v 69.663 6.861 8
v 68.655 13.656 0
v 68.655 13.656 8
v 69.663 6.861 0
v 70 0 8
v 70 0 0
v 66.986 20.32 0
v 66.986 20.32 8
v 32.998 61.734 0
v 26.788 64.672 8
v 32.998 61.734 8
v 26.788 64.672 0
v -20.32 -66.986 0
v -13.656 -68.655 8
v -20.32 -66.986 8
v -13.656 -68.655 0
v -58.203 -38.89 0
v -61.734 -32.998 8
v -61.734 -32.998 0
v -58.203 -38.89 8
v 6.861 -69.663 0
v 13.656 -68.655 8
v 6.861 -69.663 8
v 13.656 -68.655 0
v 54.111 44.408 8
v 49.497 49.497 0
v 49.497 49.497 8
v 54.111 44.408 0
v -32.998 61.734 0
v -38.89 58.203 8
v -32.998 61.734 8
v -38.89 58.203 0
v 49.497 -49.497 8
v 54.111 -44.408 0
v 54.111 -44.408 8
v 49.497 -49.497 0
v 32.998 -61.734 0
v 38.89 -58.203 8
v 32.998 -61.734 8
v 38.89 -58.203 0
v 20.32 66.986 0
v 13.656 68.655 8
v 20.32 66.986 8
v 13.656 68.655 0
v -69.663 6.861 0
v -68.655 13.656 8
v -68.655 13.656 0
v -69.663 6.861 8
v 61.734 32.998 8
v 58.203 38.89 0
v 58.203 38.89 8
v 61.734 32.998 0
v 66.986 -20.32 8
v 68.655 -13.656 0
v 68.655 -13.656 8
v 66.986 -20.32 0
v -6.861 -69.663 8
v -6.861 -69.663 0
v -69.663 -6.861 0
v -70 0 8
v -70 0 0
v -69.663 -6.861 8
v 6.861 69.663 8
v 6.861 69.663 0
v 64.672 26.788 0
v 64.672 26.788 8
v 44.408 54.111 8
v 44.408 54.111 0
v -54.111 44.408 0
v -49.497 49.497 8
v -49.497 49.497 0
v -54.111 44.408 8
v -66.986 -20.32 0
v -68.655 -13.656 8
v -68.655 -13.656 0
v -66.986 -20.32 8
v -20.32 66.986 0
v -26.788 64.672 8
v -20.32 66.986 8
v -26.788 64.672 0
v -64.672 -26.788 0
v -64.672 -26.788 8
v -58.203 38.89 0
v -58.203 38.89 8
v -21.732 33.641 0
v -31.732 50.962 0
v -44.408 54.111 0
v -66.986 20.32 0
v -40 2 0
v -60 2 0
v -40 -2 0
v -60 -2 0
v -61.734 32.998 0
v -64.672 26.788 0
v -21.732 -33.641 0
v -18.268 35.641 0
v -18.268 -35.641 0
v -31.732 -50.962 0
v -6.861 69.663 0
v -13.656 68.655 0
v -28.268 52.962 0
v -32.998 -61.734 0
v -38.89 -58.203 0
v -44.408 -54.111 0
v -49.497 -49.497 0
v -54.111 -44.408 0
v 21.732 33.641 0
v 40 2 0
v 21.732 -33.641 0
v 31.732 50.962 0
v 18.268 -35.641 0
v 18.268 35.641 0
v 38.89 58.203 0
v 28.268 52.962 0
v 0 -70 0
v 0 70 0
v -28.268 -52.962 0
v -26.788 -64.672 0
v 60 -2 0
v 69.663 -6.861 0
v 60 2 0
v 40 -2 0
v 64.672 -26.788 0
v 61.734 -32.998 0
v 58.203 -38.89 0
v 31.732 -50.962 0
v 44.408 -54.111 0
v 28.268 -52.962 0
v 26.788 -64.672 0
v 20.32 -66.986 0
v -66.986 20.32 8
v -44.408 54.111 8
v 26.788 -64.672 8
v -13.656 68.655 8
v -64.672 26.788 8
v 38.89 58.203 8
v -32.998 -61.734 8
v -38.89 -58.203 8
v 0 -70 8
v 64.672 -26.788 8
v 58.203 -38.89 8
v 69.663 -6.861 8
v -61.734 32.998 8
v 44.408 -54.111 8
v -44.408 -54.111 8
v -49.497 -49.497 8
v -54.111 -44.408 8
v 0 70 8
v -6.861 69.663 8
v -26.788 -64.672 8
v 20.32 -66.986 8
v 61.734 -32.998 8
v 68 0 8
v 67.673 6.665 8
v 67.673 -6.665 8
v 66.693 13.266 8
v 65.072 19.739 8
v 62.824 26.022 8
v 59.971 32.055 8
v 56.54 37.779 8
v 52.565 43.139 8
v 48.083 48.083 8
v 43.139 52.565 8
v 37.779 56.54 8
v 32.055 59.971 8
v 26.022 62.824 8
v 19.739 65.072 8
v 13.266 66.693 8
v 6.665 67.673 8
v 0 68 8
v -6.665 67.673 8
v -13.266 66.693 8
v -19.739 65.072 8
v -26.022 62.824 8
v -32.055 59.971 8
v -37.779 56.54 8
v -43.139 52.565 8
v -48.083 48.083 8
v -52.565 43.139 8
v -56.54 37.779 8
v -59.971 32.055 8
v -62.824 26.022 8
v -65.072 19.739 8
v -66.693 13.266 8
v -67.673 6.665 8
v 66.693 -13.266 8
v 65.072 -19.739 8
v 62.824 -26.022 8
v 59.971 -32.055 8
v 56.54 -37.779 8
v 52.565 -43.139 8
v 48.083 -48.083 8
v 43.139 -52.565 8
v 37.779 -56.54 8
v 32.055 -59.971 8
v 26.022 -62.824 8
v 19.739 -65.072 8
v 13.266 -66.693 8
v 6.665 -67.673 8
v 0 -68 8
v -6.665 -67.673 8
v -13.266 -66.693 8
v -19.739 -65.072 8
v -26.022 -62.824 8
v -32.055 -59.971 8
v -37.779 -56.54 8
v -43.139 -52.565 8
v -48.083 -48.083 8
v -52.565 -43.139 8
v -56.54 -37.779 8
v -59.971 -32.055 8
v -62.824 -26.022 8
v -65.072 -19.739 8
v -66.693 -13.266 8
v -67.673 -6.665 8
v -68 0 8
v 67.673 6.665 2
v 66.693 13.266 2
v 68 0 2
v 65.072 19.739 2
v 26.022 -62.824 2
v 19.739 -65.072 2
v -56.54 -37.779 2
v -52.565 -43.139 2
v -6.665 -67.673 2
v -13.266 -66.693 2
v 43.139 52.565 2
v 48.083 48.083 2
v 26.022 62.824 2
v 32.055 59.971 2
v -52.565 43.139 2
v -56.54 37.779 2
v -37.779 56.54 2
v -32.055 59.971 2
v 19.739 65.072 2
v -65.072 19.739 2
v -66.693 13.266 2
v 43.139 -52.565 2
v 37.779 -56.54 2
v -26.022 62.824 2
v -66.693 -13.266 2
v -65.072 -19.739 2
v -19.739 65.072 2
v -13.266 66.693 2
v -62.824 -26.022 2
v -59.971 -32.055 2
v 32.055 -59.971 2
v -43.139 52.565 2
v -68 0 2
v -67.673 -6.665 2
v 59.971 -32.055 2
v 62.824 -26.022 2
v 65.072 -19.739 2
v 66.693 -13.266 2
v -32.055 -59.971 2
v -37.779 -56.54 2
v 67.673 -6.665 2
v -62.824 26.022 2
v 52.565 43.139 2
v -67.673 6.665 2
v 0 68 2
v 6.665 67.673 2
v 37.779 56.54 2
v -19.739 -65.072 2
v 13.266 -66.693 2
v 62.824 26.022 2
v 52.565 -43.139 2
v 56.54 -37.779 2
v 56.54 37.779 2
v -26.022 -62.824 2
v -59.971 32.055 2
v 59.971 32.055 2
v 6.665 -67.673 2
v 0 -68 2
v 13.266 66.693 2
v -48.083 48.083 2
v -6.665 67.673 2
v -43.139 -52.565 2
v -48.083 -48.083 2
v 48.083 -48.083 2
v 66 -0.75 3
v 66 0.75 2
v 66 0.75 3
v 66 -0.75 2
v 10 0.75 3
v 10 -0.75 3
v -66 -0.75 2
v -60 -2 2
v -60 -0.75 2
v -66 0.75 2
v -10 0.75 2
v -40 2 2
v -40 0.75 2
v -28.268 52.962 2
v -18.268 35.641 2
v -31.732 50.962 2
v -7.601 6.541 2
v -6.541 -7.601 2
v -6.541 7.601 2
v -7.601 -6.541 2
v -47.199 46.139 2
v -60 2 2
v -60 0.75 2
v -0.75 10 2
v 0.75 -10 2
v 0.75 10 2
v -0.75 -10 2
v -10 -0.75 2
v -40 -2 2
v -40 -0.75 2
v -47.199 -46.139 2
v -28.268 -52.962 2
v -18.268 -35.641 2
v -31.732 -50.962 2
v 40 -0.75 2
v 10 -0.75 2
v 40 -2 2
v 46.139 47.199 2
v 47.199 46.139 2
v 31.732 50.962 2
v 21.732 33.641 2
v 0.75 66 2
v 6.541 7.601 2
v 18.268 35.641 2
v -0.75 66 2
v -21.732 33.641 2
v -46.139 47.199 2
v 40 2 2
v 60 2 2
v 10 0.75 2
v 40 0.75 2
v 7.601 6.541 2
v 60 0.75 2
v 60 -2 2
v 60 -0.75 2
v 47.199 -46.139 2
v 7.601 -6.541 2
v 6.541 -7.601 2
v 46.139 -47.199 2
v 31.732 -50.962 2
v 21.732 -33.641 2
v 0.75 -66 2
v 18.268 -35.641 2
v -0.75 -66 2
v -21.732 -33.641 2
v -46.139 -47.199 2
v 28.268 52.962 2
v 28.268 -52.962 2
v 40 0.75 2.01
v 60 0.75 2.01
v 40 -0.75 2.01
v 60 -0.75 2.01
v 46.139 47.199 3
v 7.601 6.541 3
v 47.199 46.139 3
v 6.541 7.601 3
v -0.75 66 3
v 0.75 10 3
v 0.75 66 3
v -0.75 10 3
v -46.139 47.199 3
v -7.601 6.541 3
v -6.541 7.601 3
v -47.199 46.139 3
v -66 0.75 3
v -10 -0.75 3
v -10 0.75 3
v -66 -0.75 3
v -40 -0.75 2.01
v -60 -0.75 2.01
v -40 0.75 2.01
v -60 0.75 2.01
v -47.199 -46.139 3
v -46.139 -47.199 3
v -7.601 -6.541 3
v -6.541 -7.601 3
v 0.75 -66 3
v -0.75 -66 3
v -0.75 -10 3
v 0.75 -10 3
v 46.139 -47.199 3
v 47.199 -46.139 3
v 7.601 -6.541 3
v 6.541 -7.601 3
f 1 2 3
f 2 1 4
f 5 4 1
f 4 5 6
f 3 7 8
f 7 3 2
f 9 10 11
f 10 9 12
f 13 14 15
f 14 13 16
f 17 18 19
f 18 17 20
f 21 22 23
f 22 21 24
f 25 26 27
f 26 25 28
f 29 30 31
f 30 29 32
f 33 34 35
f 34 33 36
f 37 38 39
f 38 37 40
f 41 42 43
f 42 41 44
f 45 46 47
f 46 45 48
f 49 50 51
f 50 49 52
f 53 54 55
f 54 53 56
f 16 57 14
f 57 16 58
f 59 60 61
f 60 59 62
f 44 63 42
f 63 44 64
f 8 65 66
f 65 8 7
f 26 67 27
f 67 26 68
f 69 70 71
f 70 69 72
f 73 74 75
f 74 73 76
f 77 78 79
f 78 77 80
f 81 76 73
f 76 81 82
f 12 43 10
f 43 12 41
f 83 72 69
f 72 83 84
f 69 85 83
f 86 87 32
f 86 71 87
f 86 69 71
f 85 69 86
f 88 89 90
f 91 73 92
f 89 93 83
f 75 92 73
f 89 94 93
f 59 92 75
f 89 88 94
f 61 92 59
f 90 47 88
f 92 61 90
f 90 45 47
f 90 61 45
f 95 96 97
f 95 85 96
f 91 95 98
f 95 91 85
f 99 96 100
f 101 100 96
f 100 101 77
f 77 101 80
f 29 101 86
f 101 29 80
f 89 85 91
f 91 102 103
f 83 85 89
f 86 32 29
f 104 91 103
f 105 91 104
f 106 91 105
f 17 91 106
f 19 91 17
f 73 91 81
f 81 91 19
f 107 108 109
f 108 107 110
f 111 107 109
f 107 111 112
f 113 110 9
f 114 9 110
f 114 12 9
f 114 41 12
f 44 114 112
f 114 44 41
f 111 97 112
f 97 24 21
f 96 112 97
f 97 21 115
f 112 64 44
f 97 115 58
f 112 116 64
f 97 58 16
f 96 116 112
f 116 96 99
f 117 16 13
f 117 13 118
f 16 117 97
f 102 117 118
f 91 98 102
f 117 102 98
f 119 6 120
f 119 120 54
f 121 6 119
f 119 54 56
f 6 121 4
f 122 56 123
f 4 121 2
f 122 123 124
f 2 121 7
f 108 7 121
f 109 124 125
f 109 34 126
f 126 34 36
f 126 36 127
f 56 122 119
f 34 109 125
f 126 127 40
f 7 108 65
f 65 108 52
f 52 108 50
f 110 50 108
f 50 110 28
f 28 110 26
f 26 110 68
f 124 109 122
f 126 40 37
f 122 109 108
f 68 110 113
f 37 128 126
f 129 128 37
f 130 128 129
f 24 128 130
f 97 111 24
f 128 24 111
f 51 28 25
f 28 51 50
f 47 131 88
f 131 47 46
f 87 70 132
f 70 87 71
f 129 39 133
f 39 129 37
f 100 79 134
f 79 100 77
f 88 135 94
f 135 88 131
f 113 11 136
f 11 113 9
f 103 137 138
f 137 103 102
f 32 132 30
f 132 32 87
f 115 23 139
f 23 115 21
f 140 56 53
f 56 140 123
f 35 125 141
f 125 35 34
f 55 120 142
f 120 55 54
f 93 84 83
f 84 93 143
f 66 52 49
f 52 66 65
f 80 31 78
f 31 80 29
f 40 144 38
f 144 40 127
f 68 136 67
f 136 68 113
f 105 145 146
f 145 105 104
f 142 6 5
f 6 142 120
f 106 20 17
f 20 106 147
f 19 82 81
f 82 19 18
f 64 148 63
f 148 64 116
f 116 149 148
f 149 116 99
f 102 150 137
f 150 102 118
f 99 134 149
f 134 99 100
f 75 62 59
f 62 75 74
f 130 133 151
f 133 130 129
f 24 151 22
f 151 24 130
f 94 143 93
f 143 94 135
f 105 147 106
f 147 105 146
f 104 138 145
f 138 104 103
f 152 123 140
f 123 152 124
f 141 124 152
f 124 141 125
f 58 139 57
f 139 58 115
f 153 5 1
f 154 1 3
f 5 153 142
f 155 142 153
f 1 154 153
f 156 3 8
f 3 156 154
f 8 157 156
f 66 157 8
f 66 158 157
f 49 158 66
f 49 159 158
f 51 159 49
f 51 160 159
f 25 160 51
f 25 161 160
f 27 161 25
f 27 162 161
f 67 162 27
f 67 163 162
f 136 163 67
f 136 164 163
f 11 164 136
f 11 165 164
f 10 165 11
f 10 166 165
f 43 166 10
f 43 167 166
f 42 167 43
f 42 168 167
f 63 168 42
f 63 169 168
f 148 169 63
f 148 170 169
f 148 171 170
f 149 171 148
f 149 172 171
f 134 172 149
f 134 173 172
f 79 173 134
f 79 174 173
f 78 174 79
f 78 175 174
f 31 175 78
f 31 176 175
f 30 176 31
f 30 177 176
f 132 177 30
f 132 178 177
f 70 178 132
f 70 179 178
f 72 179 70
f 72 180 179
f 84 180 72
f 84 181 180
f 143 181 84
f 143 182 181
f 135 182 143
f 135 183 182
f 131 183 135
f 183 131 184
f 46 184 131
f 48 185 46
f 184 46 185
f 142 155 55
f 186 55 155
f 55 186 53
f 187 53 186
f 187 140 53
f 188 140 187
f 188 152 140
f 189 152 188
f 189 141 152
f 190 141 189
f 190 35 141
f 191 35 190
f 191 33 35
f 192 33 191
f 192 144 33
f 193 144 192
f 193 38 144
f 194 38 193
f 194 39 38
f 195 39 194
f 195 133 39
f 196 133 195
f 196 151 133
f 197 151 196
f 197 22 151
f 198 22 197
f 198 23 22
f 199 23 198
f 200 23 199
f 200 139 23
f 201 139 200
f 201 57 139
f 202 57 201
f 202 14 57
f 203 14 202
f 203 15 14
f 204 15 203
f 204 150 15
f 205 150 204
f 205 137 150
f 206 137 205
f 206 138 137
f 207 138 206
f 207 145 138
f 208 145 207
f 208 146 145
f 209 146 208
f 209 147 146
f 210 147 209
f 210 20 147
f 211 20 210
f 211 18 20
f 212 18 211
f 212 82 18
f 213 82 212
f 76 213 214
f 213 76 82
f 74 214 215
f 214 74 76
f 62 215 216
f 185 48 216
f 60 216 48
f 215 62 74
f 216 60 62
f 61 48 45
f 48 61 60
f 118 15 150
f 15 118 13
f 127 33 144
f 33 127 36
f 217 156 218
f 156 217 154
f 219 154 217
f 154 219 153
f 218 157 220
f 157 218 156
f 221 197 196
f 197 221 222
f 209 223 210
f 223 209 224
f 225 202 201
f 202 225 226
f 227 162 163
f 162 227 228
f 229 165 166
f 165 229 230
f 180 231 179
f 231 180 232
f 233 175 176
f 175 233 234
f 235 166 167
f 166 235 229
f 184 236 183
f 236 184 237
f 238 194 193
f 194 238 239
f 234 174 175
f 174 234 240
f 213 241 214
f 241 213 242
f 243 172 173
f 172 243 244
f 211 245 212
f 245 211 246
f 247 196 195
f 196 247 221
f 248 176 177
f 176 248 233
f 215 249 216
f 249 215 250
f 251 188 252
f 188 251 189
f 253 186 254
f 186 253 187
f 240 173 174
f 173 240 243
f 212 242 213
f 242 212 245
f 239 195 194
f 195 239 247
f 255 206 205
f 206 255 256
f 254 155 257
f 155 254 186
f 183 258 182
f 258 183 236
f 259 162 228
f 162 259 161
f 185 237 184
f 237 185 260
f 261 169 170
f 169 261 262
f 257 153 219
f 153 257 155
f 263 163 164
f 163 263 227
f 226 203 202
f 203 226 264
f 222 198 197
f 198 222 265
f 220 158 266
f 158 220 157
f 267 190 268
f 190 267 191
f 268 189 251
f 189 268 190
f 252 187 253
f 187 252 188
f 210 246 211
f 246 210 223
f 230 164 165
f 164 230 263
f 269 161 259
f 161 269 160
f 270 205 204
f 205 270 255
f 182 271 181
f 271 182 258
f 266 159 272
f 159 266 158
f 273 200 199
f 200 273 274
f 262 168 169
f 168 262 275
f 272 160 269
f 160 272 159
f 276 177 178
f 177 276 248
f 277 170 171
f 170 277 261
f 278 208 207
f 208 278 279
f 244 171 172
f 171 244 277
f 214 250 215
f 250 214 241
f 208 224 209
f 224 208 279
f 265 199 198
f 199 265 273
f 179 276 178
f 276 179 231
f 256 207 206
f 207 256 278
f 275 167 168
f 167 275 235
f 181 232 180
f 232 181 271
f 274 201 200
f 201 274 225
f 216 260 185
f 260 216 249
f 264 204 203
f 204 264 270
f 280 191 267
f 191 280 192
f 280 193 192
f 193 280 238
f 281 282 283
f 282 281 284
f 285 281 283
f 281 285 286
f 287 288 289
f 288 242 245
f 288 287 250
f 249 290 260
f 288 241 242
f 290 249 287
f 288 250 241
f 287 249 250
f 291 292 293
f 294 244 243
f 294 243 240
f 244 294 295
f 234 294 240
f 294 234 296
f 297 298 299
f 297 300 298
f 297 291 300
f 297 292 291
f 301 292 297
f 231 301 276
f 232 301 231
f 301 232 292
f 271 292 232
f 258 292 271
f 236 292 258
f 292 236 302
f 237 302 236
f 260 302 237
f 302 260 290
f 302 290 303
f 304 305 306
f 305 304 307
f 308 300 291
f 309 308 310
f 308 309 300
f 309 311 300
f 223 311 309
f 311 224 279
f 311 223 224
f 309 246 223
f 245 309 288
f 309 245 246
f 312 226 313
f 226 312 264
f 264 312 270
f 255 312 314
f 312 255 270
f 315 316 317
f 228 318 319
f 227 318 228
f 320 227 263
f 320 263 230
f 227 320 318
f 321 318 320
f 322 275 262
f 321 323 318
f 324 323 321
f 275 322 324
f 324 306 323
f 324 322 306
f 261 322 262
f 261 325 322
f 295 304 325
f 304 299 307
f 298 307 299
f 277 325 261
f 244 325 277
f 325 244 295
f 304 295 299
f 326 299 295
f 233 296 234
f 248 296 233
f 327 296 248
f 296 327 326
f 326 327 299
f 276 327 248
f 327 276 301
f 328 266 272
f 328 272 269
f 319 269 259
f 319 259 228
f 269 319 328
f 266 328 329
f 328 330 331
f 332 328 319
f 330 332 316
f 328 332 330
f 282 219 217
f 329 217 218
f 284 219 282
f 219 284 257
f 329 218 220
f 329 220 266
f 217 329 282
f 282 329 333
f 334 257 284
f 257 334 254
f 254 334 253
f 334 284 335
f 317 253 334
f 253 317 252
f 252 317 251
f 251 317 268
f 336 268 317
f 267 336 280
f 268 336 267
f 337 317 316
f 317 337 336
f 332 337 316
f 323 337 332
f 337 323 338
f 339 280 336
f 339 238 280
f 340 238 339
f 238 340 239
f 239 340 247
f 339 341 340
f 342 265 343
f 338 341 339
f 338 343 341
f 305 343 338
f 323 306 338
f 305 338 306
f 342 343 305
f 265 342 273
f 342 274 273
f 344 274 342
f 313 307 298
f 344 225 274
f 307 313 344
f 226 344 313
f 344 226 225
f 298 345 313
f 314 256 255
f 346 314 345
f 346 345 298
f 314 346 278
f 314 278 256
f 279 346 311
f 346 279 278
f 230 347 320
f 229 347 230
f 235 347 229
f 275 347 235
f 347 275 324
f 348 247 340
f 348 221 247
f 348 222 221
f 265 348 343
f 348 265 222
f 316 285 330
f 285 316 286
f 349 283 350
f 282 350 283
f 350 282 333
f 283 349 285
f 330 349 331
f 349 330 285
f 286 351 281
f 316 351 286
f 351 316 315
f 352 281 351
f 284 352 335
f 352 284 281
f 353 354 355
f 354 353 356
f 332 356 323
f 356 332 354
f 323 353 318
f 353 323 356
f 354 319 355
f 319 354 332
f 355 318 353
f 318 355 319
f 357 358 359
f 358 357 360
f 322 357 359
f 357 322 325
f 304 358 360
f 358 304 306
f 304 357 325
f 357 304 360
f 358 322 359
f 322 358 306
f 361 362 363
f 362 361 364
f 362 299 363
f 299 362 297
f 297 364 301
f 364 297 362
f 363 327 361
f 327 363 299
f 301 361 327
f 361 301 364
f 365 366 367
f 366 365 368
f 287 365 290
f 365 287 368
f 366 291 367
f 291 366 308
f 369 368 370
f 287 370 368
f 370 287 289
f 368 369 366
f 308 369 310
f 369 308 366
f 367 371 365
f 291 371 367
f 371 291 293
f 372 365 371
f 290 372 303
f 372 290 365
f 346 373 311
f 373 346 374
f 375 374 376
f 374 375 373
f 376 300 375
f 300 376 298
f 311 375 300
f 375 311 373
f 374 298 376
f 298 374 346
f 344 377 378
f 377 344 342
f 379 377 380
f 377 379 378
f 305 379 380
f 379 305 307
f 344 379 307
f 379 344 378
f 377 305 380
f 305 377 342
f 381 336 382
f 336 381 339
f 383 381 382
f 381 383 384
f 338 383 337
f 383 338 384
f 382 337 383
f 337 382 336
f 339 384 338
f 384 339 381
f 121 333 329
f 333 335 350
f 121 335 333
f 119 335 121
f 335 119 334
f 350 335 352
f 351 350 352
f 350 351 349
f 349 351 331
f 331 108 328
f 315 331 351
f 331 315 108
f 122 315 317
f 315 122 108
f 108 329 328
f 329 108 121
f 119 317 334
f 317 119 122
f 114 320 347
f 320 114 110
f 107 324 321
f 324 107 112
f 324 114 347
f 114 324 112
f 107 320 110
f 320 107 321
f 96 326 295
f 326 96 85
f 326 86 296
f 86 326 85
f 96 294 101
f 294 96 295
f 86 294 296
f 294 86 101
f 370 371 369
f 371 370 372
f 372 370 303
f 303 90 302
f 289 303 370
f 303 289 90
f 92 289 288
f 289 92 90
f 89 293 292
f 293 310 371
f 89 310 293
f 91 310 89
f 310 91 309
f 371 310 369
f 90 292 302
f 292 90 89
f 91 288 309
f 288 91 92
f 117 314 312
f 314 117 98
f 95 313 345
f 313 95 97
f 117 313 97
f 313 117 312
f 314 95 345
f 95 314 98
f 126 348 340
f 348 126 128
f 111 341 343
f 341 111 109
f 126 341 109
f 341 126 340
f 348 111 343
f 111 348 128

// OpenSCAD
// file: ../platform.scad
// =============================================================================
// The Void -- Substrate Platform Module
// =============================================================================
//
// A shallow dish that holds the substrate block inside the dome.
// Sits on the base's internal support ledge at z=45mm.
//
// Geometry:
//   1. Base disc -- 140mm diameter, 2mm thick solid floor
//   2. Rim wall -- 6mm above disc surface, 2mm thick perimeter wall
//   3. Drain slots -- 6 radial slots (4mm x 20mm) cut through the floor
//   4. Drainage ribs -- 8 small radial ridges (1mm tall, 1.5mm wide)
//      on the floor between drain slots, elevating substrate for drainage
//
// The platform diameter (140mm) fits inside the base inner diameter (198mm)
// with clearance, and rests on the 3mm wide ledge ring at z=45mm.
//
// Source: PRODUCT-SPEC.md Section 3 -- Substrate Platform
// =============================================================================

include <parameters.scad>

// -----------------------------------------------------------------------------
// Derived platform constants
// -----------------------------------------------------------------------------

_plat_r = platform_diameter / 2;        // 70 mm -- platform outer radius
_plat_floor_h = 2;                      // mm -- floor disc thickness
_plat_rim_h = platform_rim_height + _plat_floor_h;  // 8 mm -- total rim height
_plat_rim_thickness = 2;                // mm -- rim wall thickness

// Drain slot positioning
// Slots start ~10mm inside the rim and extend toward center
_drain_start_r = _plat_r - 10;         // 60 mm -- outer end of slot (near rim)
_drain_end_r = _drain_start_r - drain_slot_length;  // 40 mm -- inner end of slot

// Drainage rib parameters
_rib_count = 8;                         // number of radial ribs
_rib_height = 1;                        // mm -- raised above floor surface
_rib_width = 1.5;                       // mm -- rib cross-section width
_rib_inner_r = 10;                      // mm -- ribs start 10mm from center
_rib_outer_r = _plat_r - _plat_rim_thickness - 2;  // mm -- stop 2mm before rim

// =============================================================================
// platform() -- Main substrate platform module
// =============================================================================
// Creates the shallow dish with rim, drain slots, and drainage ribs.
// Origin at center of disc bottom surface.
// =============================================================================

module platform() {
    difference() {
        union() {
            // 1. Base disc (solid floor)
            cylinder(
                h = _plat_floor_h,
                r = _plat_r,
                center = false
            );

            // 2. Rim wall (perimeter)
            // A hollow cylinder extending above the disc surface
            difference() {
                cylinder(
                    h = _plat_rim_h,
                    r = _plat_r,
                    center = false
                );
                translate([0, 0, -eps])
                    cylinder(
                        h = _plat_rim_h + 2 * eps,
                        r = _plat_r - _plat_rim_thickness,
                        center = false
                    );
            }

            // 3. Drainage ribs (small radial ridges on floor surface)
            // 8 ribs evenly spaced (45 deg apart), raised 1mm above the floor
            // These elevate the substrate block so water flows underneath
            // to the drain slots.
            for (i = [0 : _rib_count - 1]) {
                rotate([0, 0, i * (360 / _rib_count)])
                    translate([(_rib_inner_r + _rib_outer_r) / 2, 0, _plat_floor_h + _rib_height / 2])
                        cube(
                            [_rib_outer_r - _rib_inner_r,
                             _rib_width,
                             _rib_height],
                            center = true
                        );
            }
        }

        // 4. Drain slots (cut through the floor)
        // 6 radial slots equally spaced (60 deg apart)
        // Each is a rectangular cutout extending through the full floor thickness
        for (i = [0 : drain_slot_count - 1]) {
            rotate([0, 0, i * (360 / drain_slot_count)])
                translate([(_drain_start_r + _drain_end_r) / 2, 0, _plat_floor_h / 2])
                    cube(
                        [drain_slot_length,
                         drain_slot_width,
                         _plat_floor_h + 2 * eps],
                        center = true
                    );
        }
    }
}

// =============================================================================
// Render when called directly
// =============================================================================
platform();
// file: ../parameters.scad
// =============================================================================
// The Void -- Parametric Constants Module
// =============================================================================
//
// All dimensions for The Void mushroom cultivation dome.
// Units: millimeters (mm) unless otherwise noted.
// Source: PRODUCT-SPEC.md
//
// Usage: include <parameters.scad> in any module file.
// =============================================================================

// -----------------------------------------------------------------------------
// Global Settings
// -----------------------------------------------------------------------------

// Render quality: set quality = "preview" for fast preview, "render" for final
// From PRODUCT-SPEC.md OpenSCAD conventions
quality = "preview";  // "preview" or "render"
$fn = (quality == "render") ? 128 : 64;

// FDM printing tolerance / clearance
// Standard FDM tolerance for friction-fit parts
fdm_tolerance = 0.2;  // mm -- default clearance for FDM printing

// Small epsilon for boolean operations (prevents z-fighting)
eps = 0.01;  // mm

// -----------------------------------------------------------------------------
// Overall Dimensions
// From PRODUCT-SPEC.md Section 1 -- Overall Dimensions
// -----------------------------------------------------------------------------

total_diameter = 203;   // mm (8.0") -- widest point at dome-base junction
total_height   = 254;   // mm (10.0") -- dome + base assembled
dome_height    = 165;   // mm (6.5") -- from base top to dome apex
base_height    = 89;    // mm (3.5") -- houses electronics, platform, airflow plenum

// -----------------------------------------------------------------------------
// Dome Parameters
// From PRODUCT-SPEC.md Section 2 -- Dome Shell
// -----------------------------------------------------------------------------

dome_outer_diameter = 203;  // mm (8.0") -- matches total_diameter
dome_inner_diameter = 190;  // mm (7.5") -- wall thickness reduces usable interior
dome_wall_thickness = 2.0;  // mm -- structural integrity + light diffusion

// Dome geometry breakdown
dome_vertical_sidewall_height = 25;   // mm (1.0") -- straight-walled section at base
dome_hemisphere_height        = 140;  // mm (dome_height - sidewall = 165 - 25)
dome_apex_flat                = 10;   // mm -- flat at top for clean 3D print bridging

// Derived dome radii
dome_outer_radius = dome_outer_diameter / 2;  // 101.5 mm
dome_inner_radius = dome_inner_diameter / 2;  // 95.0 mm

// Exhaust vents (dome upper)
// From PRODUCT-SPEC.md Section 4 -- Exhaust Vents
exhaust_vent_diameter        = 12;   // mm (0.47") -- individual hole diameter
exhaust_vent_count           = 4;    // quantity -- evenly spaced around circumference
exhaust_vent_angle_from_apex = 60;   // degrees -- position in upper third of dome

// Magnet pocket (dome seating lip)
// From PRODUCT-SPEC.md Section 2 -- Magnetic reed switch integration
magnet_pocket_diameter = 6.5;  // mm -- sized for 6mm neodymium disc magnet + clearance
magnet_pocket_depth    = 2.5;  // mm -- depth into dome seating lip

// Alignment notch (dome seating lip)
// From PRODUCT-SPEC.md Section 2 -- Dome-to-Base Interface
alignment_notch_width = 5;  // mm -- single notch for dome orientation
alignment_notch_depth = 3;  // mm -- depth of rectangular cutout in seating lip

// Seating lip
// From PRODUCT-SPEC.md Section 2 -- Dome-to-Base Interface
dome_seating_lip_height = 2.0;  // mm -- inward step at bottom edge of dome
dome_seating_lip_inset  = 2.0;  // mm -- how far inward the lip steps

// -----------------------------------------------------------------------------
// Base Parameters
// From PRODUCT-SPEC.md Section 3 -- Base Unit
// -----------------------------------------------------------------------------

base_outer_diameter = 203;  // mm (8.0") -- matches dome diameter for flush fit
// base_height already defined above (89 mm)
base_wall_thickness = 2.5;  // mm -- slightly thicker than dome for rigidity

// Dome seating channel (base top rim)
// From PRODUCT-SPEC.md Section 2 -- Dome-to-Base Interface
dome_seating_channel_depth = 2.0;  // mm -- recessed channel in base top surface
dome_seating_channel_width = 2.0;  // mm -- width of the seating groove

// Silicone gasket groove
// From PRODUCT-SPEC.md Section 2 -- silicone gasket ring in base channel
gasket_groove_depth = 1.5;  // mm -- groove for silicone gasket ring
gasket_groove_width = 2.0;  // mm -- width of gasket groove

// Intake vents (base lower perimeter)
// From PRODUCT-SPEC.md Section 4 -- Intake Vents
intake_vent_width  = 15;  // mm (0.6") -- individual slot width
intake_vent_height = 5;   // mm (0.2") -- individual slot height
intake_vent_count  = 8;   // quantity -- evenly distributed around circumference

// USB-C cutout (rear-center of base)
// From PRODUCT-SPEC.md Section 10 -- Physical Connectors
usb_cutout_width  = 9;    // mm -- rectangular cutout for USB-C receptacle
usb_cutout_height = 3.5;  // mm -- height of USB-C cutout

// Mode button cutout (front-center of base)
// From PRODUCT-SPEC.md Section 10 -- Physical Controls
button_cutout_diameter = 12;  // mm -- waterproof silicone-cap tactile switch

// Red indicator LED hole
// From PRODUCT-SPEC.md Section 10 -- Visual Indicators
led_indicator_diameter = 3;  // mm -- 3mm through-hole LED

// -----------------------------------------------------------------------------
// Platform Parameters
// From PRODUCT-SPEC.md Section 3 -- Substrate Platform
// -----------------------------------------------------------------------------

platform_diameter  = 140;  // mm (5.5") -- centered in base, sized for Void Pack
platform_depth     = 13;   // mm (0.5") -- shallow recessed well
platform_rim_height = 6;   // mm (0.25") -- raised lip prevents block sliding

// Drain slots in platform
// From PRODUCT-SPEC.md Section 3 -- Substrate Platform (4-6 drain slots)
drain_slot_count  = 6;   // quantity
drain_slot_width  = 4;   // mm
drain_slot_length = 20;  // mm

// -----------------------------------------------------------------------------
// Void Core Additions
// From PRODUCT-SPEC.md Section 8 -- Void Core Smart Electronics
// -----------------------------------------------------------------------------

// Raspberry Pi Zero W 2 dimensions
pi_zero_width  = 30;  // mm -- board width
pi_zero_length = 65;  // mm -- board length

// 30mm axial fan
// From PRODUCT-SPEC.md Section 4 -- Void Core Active Airflow
fan_diameter = 30;  // mm -- 5V DC axial fan
fan_depth    = 10;  // mm -- fan thickness

// BME280 sensor breakout board
// From PRODUCT-SPEC.md Section 8 -- BME280 sensor
bme280_width  = 13;  // mm -- typical breakout board width
bme280_length = 11;  // mm -- typical breakout board length

// Piezoelectric humidifier reservoir
// From PRODUCT-SPEC.md Section 5 -- Void Core Active Humidity
humidifier_reservoir_diameter = 40;  // mm -- reservoir well diameter
humidifier_reservoir_depth    = 25;  // mm -- reservoir well depth

// Motorized damper servo
// From PRODUCT-SPEC.md Section 8 -- Motorized damper
servo_width  = 12;  // mm -- small servo width
servo_length = 23;  // mm -- small servo length

// -----------------------------------------------------------------------------
// Vent Cap Parameters
// From PRODUCT-SPEC.md Section 4 -- Exhaust Vent Cover Design
// From BUILD-GUIDE.md Section 2 -- void-vent-cap.stl
// -----------------------------------------------------------------------------

vent_cap_outer_diameter  = 16;   // mm (exhaust_vent_diameter + 4mm lip)
vent_cap_inner_diameter  = 12;   // mm -- matches exhaust vent hole diameter
vent_cap_depth           = 4;    // mm -- depth of cap body
vent_cap_snap_thickness  = 1.0;  // mm -- snap-fit tab thickness
// main file
// =============================================================================
// The Void -- STL Export: Substrate Platform
// =============================================================================
// Renders platform() at high quality for STL export.
// Print orientation: flat (natural, bottom surface on bed).
// Output: void-platform.stl
// OpenSCAD: File > Export > STL
// =============================================================================

include <../parameters.scad>
use <../platform.scad>

$fn = 128;  // High quality for export

platform();
